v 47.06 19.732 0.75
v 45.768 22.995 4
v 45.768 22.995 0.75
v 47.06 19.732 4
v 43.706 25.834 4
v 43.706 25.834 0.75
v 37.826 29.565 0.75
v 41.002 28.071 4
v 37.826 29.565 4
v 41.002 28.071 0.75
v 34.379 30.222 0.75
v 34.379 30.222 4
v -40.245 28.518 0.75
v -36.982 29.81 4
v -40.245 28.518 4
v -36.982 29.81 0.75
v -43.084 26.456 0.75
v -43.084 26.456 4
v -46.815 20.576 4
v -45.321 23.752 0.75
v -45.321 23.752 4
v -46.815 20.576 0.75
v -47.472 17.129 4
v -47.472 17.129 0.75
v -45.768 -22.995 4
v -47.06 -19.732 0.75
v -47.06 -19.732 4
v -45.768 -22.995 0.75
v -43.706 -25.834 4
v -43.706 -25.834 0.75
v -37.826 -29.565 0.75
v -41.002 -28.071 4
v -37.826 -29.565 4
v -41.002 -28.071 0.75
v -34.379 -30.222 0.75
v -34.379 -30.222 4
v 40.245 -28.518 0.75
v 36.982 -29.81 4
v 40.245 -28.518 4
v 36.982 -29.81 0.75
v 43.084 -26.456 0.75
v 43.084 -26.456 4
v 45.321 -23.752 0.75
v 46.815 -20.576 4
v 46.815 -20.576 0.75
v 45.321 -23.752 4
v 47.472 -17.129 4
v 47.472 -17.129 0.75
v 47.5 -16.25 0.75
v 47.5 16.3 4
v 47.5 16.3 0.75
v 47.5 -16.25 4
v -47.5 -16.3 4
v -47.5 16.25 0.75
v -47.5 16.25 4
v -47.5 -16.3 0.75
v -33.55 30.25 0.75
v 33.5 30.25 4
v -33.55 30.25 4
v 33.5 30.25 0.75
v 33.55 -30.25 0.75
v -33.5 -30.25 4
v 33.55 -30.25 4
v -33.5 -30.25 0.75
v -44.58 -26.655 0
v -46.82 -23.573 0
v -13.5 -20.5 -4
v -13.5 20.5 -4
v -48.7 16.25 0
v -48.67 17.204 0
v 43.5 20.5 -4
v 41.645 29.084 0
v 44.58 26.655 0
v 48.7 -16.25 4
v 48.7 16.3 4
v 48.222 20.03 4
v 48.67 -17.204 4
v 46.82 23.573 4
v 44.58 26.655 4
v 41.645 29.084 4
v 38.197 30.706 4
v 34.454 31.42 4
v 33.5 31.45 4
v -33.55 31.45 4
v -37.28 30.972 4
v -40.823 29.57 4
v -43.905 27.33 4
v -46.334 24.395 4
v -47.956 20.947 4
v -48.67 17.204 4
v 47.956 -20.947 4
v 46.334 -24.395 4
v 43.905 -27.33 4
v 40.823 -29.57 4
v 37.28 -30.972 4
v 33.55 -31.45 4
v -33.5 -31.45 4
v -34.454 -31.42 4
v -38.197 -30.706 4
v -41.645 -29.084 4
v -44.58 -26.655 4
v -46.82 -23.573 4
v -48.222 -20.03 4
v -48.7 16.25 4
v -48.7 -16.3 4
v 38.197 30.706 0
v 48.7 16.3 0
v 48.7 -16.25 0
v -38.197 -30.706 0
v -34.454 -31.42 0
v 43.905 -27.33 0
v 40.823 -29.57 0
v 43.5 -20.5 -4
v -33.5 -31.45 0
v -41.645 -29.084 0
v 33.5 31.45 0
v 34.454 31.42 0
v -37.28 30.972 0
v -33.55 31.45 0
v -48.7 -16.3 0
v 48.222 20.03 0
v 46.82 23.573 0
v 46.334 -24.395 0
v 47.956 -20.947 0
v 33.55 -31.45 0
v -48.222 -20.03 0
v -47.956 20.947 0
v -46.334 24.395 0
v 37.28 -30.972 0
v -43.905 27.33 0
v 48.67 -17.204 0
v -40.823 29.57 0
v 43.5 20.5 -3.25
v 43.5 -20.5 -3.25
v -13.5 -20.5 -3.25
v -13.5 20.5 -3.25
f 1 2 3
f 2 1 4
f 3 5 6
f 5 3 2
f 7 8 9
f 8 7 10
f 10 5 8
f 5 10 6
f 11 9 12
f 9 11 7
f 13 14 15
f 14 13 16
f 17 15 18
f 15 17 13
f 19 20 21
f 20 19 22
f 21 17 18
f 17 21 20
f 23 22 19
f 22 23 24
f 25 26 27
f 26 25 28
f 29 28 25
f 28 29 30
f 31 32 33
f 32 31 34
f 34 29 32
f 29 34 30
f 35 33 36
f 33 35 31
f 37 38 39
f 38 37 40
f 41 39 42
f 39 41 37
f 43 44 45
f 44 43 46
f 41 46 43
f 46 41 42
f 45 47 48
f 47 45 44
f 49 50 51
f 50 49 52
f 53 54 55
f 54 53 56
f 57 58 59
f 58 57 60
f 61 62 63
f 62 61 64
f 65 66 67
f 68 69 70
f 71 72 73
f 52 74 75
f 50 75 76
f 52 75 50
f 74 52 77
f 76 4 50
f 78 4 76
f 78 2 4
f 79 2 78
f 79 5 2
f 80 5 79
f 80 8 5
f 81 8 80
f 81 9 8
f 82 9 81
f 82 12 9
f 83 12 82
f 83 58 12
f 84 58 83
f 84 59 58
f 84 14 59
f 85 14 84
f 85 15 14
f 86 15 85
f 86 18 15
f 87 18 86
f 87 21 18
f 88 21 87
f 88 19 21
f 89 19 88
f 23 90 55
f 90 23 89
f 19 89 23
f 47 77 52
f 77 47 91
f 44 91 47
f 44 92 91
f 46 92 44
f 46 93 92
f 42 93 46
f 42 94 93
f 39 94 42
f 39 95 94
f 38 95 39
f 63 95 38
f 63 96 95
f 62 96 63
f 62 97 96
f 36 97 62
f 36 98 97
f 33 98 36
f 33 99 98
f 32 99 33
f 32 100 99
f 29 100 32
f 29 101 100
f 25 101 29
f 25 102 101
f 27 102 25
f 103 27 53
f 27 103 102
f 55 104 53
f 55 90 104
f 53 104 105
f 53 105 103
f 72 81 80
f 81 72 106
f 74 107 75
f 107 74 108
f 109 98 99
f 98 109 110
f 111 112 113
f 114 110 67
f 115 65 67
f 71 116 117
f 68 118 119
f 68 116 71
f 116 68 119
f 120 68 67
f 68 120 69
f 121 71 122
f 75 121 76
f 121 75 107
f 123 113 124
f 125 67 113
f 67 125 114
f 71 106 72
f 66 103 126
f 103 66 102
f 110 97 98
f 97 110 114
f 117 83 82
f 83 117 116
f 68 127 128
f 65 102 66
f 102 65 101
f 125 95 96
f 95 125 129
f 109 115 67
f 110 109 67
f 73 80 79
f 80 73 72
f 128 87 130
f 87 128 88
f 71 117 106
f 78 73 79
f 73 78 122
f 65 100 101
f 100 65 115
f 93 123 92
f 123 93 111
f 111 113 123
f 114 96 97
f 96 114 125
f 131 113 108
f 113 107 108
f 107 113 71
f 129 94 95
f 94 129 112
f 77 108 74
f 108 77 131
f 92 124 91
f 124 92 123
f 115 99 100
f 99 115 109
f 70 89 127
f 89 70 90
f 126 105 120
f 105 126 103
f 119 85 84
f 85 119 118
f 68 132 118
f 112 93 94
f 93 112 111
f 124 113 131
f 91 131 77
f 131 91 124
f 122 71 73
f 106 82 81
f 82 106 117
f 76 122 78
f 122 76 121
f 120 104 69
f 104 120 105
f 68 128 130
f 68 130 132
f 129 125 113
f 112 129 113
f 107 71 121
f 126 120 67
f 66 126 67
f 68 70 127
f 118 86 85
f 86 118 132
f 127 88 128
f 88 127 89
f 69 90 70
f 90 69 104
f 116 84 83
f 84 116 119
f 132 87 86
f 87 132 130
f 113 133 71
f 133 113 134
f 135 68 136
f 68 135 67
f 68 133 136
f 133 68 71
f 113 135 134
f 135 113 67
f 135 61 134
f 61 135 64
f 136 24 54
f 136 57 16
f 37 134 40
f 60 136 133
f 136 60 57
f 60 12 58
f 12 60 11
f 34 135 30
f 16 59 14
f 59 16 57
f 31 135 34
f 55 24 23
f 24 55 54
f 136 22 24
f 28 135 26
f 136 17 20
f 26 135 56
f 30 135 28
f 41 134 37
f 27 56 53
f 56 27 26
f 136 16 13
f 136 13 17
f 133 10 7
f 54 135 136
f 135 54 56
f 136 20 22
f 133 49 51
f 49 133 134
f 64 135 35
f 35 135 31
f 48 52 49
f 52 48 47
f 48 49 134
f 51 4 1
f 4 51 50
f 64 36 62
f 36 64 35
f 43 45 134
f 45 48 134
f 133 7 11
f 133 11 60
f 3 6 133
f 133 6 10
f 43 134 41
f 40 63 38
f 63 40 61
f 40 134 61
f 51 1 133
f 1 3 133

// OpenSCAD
epaisseur1=1.5;
radius=12.5;
xb=92+2*epaisseur1;
yb=57.5+2*epaisseur1;
offset=4;
voffset = .75;
rebord = 4;
epaisseur=1.2;
marge_ba=1.2;

difference () {

// coque de base
	hull () {
		
      // cube de coque
		translate([xb/2-57/2-offset,0,-2])
		cube([57, 41, 4], center = true);
		
		translate([0,0,rebord / 2])
		roundCornersCube(xb+epaisseur*2,yb+epaisseur*2,rebord,radius+epaisseur+epaisseur1);
		
	}

// ceci est la mint tin box (exterieur)
translate([0,0,25+marge_ba])
roundCornersCube(xb,yb,50,radius+epaisseur1);

// ceci est l'ecran
translate([xb/2-57/2-offset,0,-2])
cube([57, 41, 100], center = true);

// on evide l'interieur
hull () {
		
      // cube de coque
		translate([xb/2-57/2-offset,0,-2+voffset])
		cube([57, 41, 4], center = true);
		
		translate([0,0,2+voffset])
		roundCornersCube(xb,yb,4,radius+epaisseur1);
		
	}


}

/////////////////////////////////
/////////////////////////////////
/////////////////////////////////
/////////////////////////////////

module createMeniscus(h,radius) // This module creates the shape that needs to be substracted from a cube to make its corners rounded.
difference(){        //This shape is basicly the difference between a quarter of cylinder and a cube
   translate([radius/2+0.1,radius/2+0.1,0]){
      cube([radius+0.2,radius+0.1,h+0.2],center=true);         // All that 0.x numbers are to avoid "ghost boundaries" when substracting
   }

   cylinder(h=h+0.2,r=radius,$fn = 25,center=true);
}


module roundCornersCube(x,y,z,r)  // Now we just substract the shape we have created in the four corners
difference(){
   cube([x,y,z], center=true);

translate([x/2-r,y/2-r]){  // We move to the first corner (x,y)
      rotate(0){  
         createMeniscus(z,r); // And substract the meniscus
      }
   }
   translate([-x/2+r,y/2-r]){ // To the second corner (-x,y)
      rotate(90){
         createMeniscus(z,r); // But this time we have to rotate the meniscus 90 deg
      }
   }
      translate([-x/2+r,-y/2+r]){ // ... 
      rotate(180){
         createMeniscus(z,r);
      }
   }
      translate([x/2-r,-y/2+r]){
      rotate(270){
         createMeniscus(z,r);
      }
   }
}
